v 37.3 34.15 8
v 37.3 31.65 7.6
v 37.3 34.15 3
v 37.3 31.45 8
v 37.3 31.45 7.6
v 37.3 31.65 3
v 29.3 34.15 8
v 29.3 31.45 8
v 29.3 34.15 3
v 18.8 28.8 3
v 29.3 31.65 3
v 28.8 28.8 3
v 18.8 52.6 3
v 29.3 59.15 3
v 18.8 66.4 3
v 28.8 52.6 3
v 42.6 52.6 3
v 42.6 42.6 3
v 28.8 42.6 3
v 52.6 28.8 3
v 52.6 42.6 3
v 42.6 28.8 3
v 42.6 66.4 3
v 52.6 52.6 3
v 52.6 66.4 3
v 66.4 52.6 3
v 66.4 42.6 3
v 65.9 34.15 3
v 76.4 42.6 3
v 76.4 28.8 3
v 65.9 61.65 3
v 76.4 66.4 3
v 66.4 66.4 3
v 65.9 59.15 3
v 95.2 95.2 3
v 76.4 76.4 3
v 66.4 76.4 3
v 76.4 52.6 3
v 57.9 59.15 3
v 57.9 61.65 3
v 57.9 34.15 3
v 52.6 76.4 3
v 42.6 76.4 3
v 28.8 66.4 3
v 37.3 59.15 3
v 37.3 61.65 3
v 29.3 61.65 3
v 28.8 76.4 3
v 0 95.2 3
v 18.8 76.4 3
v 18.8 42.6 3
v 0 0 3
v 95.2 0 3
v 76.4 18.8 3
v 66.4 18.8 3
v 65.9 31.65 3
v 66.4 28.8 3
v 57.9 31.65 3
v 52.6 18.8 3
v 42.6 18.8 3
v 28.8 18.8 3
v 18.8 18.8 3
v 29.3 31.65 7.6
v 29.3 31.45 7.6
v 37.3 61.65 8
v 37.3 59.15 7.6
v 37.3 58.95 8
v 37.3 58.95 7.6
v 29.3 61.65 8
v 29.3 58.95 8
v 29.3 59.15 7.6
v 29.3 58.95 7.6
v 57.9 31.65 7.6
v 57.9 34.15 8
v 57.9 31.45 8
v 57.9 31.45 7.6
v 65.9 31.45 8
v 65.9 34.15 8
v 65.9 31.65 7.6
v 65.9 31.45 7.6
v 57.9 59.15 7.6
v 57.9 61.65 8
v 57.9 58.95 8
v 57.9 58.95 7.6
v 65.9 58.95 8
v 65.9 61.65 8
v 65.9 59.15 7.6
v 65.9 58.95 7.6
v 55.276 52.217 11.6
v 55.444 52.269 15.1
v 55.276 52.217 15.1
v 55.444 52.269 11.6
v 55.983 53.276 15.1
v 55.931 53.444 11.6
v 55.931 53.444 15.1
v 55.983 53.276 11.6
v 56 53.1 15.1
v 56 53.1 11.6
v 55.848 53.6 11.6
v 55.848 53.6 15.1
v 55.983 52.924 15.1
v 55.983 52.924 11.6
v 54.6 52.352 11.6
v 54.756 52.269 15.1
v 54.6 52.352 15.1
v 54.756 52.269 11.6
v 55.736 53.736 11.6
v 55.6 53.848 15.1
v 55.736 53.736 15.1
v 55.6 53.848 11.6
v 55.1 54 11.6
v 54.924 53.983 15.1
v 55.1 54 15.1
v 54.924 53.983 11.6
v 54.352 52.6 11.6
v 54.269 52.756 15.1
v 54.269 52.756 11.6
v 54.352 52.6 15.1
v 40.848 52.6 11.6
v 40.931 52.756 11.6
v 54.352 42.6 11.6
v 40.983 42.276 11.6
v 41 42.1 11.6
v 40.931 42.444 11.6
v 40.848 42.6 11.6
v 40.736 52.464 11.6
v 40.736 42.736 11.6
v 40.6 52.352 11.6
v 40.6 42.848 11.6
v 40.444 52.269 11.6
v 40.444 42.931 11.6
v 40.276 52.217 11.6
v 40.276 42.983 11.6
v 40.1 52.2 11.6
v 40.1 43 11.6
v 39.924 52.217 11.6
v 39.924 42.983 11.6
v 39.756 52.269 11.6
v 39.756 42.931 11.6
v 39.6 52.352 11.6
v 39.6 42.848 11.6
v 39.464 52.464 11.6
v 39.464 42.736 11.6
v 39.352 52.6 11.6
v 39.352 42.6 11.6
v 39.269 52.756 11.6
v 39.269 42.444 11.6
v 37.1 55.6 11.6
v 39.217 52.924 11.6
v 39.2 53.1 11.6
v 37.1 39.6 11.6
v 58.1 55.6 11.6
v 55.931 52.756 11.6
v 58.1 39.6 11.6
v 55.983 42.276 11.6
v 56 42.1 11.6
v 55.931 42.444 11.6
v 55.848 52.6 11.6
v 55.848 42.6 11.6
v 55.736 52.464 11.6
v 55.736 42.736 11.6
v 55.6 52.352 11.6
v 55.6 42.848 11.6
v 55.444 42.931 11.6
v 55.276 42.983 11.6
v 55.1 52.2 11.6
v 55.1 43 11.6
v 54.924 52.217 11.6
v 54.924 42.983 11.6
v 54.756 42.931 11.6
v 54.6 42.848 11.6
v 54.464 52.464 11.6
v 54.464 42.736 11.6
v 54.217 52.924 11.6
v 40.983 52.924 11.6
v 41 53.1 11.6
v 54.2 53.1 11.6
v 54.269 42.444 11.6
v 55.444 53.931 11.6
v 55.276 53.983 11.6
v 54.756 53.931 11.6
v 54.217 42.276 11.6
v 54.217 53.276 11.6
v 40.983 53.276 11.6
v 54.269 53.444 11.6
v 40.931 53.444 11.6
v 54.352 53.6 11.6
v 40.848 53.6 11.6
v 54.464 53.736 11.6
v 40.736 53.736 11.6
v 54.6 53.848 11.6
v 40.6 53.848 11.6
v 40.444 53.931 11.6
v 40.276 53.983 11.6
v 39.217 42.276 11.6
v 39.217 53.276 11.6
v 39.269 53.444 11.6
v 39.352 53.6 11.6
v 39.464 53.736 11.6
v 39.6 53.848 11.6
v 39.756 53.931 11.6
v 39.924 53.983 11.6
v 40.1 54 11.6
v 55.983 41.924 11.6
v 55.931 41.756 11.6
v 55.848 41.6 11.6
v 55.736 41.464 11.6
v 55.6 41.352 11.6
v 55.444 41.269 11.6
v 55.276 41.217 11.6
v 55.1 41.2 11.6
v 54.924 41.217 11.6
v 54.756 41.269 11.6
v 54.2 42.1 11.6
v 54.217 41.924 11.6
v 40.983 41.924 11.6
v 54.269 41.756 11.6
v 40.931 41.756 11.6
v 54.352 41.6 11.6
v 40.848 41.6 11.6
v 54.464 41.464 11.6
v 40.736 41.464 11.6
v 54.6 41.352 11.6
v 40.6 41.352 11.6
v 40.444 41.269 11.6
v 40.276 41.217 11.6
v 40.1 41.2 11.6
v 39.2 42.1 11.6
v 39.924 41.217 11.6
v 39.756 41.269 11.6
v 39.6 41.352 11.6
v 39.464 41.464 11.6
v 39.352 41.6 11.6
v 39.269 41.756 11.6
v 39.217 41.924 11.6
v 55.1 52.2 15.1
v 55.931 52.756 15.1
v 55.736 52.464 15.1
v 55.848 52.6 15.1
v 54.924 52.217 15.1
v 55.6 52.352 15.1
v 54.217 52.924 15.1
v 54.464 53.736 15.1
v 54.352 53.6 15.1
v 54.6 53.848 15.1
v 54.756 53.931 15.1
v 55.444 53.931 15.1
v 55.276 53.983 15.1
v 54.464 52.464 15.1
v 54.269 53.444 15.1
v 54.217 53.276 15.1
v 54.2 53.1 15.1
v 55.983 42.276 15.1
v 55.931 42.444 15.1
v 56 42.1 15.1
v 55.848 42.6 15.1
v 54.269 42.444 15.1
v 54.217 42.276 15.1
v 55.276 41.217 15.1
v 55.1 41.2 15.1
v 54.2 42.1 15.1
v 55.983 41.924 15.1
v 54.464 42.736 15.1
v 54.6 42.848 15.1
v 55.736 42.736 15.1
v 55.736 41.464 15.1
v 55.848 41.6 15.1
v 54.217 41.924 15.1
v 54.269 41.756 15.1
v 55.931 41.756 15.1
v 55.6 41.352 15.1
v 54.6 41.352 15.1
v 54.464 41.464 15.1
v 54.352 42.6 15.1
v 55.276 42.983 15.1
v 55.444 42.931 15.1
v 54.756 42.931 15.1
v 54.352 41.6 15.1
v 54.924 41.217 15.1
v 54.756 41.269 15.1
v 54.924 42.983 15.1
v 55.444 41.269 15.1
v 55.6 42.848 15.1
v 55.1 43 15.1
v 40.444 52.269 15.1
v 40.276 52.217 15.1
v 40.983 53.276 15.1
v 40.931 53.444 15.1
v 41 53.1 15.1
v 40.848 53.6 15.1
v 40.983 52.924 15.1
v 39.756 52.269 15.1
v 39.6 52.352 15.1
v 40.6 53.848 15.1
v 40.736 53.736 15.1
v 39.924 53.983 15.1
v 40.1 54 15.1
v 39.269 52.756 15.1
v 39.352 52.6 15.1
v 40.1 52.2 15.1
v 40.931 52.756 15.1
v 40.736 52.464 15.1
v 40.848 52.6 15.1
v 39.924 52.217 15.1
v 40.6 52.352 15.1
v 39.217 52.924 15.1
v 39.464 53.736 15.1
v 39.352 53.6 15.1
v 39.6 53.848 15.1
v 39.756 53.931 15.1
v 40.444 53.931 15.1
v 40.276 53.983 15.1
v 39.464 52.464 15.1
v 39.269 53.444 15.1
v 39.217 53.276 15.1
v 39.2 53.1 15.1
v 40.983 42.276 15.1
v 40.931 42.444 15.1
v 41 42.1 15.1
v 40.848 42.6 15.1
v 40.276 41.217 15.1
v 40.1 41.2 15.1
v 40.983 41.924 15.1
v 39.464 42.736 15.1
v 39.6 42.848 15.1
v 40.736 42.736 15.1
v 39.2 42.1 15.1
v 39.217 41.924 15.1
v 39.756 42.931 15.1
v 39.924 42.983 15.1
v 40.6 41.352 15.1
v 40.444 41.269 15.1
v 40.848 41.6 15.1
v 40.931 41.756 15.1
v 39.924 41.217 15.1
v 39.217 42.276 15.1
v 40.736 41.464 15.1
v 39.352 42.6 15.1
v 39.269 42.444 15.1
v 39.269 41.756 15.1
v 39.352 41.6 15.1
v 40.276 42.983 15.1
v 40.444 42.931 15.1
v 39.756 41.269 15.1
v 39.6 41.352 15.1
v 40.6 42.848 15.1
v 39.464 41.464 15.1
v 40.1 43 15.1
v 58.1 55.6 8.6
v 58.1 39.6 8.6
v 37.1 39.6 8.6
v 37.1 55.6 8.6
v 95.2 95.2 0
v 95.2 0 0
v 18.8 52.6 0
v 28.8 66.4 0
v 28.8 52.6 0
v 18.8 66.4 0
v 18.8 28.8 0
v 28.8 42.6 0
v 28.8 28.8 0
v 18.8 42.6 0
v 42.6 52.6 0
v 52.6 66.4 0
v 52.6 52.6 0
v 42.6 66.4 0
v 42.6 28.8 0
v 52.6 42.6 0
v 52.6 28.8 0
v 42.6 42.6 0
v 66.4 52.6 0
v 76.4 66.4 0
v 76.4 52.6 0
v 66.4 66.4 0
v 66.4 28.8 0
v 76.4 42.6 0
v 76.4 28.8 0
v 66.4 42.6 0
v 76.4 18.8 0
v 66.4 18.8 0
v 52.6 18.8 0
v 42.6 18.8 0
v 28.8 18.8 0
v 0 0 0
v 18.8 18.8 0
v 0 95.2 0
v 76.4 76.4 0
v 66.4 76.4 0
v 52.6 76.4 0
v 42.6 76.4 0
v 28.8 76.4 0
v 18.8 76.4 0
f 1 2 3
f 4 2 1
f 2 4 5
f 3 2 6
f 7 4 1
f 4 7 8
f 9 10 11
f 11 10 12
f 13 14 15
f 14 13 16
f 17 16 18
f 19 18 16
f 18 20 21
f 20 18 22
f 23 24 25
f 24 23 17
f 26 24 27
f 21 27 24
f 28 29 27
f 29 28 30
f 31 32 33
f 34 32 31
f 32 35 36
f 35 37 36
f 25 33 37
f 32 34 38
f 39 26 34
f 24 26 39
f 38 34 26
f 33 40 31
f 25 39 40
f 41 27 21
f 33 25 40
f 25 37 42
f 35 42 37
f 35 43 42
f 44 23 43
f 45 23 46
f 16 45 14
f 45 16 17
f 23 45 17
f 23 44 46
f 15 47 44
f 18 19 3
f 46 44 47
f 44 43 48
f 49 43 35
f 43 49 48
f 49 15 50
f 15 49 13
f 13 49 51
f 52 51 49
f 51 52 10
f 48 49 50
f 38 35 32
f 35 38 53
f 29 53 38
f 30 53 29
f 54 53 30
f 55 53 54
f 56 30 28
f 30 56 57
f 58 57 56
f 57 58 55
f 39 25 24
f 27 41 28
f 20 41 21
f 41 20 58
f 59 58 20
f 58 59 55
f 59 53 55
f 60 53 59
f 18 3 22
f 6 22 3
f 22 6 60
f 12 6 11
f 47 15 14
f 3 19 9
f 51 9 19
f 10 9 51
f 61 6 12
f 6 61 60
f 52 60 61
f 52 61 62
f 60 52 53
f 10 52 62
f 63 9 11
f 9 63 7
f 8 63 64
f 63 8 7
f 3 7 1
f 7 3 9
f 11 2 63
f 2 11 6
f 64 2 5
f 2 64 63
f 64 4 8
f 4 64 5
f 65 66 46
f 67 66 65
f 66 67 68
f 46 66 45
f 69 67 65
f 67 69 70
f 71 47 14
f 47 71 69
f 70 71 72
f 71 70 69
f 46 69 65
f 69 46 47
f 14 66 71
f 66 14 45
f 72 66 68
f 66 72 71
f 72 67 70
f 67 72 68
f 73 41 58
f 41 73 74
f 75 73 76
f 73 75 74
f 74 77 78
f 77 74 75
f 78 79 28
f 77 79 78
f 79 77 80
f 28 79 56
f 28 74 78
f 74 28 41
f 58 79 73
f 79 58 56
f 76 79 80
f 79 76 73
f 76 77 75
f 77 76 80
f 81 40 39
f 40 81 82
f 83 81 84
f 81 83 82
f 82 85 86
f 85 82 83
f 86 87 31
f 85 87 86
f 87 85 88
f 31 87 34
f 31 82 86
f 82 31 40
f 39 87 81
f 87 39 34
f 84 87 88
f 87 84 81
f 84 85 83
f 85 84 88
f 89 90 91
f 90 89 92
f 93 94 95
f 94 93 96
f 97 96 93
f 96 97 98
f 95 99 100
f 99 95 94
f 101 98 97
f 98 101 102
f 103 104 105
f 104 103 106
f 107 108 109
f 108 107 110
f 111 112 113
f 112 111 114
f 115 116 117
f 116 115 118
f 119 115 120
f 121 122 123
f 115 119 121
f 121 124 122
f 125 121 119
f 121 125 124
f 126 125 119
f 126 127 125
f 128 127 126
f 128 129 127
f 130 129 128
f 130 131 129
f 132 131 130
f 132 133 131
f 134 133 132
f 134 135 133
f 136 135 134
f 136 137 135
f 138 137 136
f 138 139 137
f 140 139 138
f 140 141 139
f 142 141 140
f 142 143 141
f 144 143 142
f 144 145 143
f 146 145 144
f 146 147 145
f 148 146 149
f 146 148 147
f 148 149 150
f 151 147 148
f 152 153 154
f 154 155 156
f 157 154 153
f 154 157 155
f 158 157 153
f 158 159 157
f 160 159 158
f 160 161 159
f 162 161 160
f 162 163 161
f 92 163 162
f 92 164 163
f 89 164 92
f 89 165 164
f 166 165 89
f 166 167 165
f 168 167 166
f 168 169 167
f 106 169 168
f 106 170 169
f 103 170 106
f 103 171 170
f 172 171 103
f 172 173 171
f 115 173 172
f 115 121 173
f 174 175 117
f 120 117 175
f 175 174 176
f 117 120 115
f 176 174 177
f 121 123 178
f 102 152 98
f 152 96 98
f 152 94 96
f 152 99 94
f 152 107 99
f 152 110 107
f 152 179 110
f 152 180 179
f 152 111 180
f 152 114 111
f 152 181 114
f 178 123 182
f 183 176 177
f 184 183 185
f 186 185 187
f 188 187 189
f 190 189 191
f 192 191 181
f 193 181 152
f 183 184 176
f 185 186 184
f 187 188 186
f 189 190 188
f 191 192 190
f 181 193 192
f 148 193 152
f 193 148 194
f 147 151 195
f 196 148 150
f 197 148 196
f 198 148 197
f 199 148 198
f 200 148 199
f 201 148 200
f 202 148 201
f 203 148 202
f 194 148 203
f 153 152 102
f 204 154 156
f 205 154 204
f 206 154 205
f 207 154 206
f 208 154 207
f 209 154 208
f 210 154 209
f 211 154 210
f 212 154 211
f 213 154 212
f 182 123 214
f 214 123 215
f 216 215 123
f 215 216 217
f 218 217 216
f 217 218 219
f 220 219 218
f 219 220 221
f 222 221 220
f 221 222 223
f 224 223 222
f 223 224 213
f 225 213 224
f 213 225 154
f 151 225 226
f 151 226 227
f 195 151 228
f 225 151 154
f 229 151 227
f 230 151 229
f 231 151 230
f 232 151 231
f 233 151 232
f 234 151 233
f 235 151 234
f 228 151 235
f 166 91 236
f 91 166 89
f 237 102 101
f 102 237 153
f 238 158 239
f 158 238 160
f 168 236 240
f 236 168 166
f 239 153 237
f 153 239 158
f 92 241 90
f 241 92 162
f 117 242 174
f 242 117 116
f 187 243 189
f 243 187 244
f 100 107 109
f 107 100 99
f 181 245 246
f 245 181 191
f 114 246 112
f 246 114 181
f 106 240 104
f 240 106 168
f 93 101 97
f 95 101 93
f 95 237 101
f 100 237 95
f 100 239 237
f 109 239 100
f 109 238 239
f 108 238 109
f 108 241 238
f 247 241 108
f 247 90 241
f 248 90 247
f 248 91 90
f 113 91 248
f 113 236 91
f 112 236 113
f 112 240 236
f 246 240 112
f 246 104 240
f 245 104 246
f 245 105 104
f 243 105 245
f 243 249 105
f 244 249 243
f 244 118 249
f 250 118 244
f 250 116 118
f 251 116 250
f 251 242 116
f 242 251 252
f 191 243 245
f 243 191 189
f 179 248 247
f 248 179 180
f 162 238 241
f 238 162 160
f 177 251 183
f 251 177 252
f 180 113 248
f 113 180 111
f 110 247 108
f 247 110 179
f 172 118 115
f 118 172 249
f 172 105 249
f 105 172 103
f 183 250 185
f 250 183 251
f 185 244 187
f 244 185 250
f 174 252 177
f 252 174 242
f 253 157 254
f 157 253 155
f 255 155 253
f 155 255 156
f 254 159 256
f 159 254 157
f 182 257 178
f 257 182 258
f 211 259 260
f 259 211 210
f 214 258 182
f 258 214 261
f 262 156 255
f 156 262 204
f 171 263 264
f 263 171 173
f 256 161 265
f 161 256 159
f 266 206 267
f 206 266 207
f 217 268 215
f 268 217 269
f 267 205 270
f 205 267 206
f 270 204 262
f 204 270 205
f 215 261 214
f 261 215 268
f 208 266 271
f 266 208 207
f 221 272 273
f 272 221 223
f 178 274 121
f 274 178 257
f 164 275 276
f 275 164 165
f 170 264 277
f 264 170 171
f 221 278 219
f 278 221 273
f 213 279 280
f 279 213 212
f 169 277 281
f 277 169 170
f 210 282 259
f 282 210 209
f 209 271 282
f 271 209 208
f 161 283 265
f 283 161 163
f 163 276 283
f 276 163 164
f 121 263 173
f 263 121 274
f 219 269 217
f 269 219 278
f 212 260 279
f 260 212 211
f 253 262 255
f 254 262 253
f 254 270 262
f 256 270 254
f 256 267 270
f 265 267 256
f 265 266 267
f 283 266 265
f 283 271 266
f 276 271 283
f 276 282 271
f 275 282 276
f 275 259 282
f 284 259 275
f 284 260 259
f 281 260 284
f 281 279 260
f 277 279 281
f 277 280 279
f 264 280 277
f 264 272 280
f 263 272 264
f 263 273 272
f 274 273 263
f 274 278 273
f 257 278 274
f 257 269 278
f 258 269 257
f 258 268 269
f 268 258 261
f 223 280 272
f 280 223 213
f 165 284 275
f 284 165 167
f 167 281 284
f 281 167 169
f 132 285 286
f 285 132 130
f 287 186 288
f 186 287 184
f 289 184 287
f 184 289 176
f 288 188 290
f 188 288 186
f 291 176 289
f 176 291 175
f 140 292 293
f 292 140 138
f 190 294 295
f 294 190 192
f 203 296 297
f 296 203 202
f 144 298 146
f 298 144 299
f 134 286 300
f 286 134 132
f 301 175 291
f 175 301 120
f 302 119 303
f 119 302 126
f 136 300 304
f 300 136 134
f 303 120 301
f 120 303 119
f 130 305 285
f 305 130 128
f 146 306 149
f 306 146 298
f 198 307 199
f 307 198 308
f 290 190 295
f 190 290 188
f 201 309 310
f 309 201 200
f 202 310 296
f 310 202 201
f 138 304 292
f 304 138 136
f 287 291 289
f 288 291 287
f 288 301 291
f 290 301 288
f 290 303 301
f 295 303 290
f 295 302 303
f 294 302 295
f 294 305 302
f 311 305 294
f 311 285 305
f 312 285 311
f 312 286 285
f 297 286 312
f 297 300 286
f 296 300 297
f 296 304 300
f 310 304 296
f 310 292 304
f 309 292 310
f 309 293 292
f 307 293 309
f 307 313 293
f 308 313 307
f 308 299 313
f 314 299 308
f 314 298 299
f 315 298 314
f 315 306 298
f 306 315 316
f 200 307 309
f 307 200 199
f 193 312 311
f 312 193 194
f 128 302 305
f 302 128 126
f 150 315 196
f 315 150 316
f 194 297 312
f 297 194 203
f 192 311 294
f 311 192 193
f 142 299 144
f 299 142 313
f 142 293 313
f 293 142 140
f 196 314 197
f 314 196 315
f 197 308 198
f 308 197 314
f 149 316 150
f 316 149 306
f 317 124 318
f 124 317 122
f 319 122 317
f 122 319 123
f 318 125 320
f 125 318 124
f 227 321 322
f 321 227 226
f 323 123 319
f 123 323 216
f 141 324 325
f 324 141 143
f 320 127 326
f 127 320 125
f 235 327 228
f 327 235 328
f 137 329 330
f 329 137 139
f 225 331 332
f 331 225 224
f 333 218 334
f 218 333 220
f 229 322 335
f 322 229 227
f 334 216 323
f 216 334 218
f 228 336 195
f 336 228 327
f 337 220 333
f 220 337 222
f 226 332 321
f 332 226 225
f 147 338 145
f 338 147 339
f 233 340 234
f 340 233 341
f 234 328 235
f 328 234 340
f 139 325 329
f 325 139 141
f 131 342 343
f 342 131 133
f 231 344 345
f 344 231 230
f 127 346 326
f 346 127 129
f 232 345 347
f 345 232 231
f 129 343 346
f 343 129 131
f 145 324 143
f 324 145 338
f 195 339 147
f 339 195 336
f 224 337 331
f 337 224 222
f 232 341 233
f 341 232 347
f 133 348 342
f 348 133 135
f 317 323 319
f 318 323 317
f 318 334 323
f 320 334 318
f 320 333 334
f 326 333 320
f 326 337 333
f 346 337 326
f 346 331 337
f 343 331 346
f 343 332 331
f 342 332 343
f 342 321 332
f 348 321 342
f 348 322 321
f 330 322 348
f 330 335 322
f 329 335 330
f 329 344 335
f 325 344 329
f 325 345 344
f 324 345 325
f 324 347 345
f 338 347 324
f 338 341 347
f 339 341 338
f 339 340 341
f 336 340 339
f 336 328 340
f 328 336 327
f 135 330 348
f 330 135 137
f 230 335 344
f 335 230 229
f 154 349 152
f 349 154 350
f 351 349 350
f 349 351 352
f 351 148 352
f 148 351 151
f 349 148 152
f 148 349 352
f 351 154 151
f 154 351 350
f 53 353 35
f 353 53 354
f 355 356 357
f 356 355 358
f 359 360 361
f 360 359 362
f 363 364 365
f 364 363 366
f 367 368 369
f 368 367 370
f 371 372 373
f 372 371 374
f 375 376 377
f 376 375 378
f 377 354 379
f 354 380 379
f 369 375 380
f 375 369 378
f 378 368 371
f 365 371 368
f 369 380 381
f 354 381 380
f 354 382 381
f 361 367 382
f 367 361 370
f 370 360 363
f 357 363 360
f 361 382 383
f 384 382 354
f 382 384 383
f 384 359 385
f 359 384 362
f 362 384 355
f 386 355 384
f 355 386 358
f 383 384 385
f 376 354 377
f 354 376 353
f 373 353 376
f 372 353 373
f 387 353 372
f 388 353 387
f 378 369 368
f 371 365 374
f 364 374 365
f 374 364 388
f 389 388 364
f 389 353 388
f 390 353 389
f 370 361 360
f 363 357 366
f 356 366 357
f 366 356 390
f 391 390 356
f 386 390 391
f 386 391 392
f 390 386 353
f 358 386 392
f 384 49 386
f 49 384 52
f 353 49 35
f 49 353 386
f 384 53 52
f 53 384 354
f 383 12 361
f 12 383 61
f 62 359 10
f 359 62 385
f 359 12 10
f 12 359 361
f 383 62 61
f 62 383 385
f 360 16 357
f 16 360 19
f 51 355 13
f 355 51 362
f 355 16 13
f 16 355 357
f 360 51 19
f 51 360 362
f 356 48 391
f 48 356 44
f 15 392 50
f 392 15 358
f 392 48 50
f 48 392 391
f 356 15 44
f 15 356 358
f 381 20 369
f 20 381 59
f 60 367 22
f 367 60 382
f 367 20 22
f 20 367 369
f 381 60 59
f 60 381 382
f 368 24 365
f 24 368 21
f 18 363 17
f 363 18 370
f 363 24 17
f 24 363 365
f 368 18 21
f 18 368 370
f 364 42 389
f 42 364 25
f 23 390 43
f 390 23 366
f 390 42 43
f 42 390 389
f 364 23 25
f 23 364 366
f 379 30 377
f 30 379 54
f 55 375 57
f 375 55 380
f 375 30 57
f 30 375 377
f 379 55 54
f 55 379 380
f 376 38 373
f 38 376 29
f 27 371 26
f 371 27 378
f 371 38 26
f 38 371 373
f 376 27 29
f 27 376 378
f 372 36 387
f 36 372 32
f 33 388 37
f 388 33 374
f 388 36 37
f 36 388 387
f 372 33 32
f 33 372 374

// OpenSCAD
// ═══════════════════════════════════════════════════════════════
//  CubeSat İç Montaj Tepsisi
//  ESP32 DevKit (38-pin, 55×28 mm) + MPU6050 GY-521 (21×16 mm)
//
//  Tasarım kararları:
//   • ESP32  → ray klipsleri (vidaya gerek yok, PCB kenarından tutulur)
//   • MPU6050 → merkeze yerleştirilmiş platform + pimler
//   • USB-C girişi için yan duvarda pencere (programlarken çıkarmak gerekmez)
//   • Tepsi gövde içine kayar, alt kapak ile kilitlenir
//
//  PARÇA SEÇİMİ (PART değişkeni):
//    "tray"    → ESP32 + MPU6050 tepsisi  (1 adet bas)
//    "preview" → ESP32 ve MPU6050 ile birlikte önizleme
// ═══════════════════════════════════════════════════════════════

PART = "tray";

$fn = 32;

// ── CubeSat gövde iç boyutu ───────────────────────────────────
INNER = 96;       // gövde iç kenar (100mm - 2×2mm et)
TOL   =  0.4;     // tepsi-gövde toleransı
TRAY_W = INNER - TOL*2;   // 95.2 mm
TRAY_H = INNER - TOL*2;
TRAY_T =  3.0;    // taban plaka kalınlığı

// ── ESP32 DevKit v1 (38-pin) ──────────────────────────────────
// PCB boyutu — yaygın clone değerleri
E32_L   = 55.0;   // uzun kenar
E32_W   = 28.0;   // kısa kenar
E32_PCB =  1.6;   // PCB kalınlığı (standart FR4)
E32_PIN =  3.0;   // pin uzunluğu (PCB altında)
CLIP_H  =  5.0;   // klips yüksekliği (PCB + biraz fazla)
CLIP_LIP = 1.2;   // PCB üstünü tutan dudak
CLIP_W  =  8.0;   // her klipsin genişliği

// ── MPU6050 GY-521 ────────────────────────────────────────────
MPU_L   = 21.0;
MPU_W   = 16.0;
MPU_PCB =  1.6;
MPU_POST_H = 3.0; // platform yüksekliği (MPU altındaki boşluk)
MPU_PEG_D  = 1.8; // pim çapı (≈ 2mm deliğe girecek, biraz baskılı)
MPU_PEG_SX = 15.0; // delik açıklığı — kısa kenar
MPU_PEG_SY = 11.0; // delik açıklığı — uzun kenar

// ── Kablo bağı yuvaları ───────────────────────────────────────
TIE_W = 3.5;
TIE_H = 2.0;

// ── USB-C pencere boyutu ──────────────────────────────────────
USB_W = 10;   // USB-C konnektör genişliği + pay
USB_H =  5;

// ═══════════════════════════════════════════════════════════════
//  YARDIMCI MODÜLLER
// ═══════════════════════════════════════════════════════════════

// ESP32 klips (PCB kenarını tutan L-profil)
// origin: klipsin alt-sol köşesi, PCB bu profilin içine girer
module esp32_clip() {
    difference() {
        cube([CLIP_W, E32_PCB + CLIP_LIP + 1.5, CLIP_H]);
        // PCB yuvası
        translate([-0.1, 0, E32_PIN])
            cube([CLIP_W + 0.2, E32_PCB + 0.2, CLIP_H]);
        // alt girişi aç (PCB kayarken girmesi için)
        translate([-0.1, -0.1, -0.1])
            cube([CLIP_W + 0.2, E32_PCB + 0.2 + 0.1, E32_PIN + 0.1]);
    }
    // dudak (PCB üstüne basan kısım)
    translate([0, E32_PCB, E32_PIN + E32_PCB])
        cube([CLIP_W, CLIP_LIP, CLIP_H - E32_PIN - E32_PCB]);
}

// Kablo bağı yuvası
module cable_tie_slot(l = 20) {
    cube([l, TIE_W, TIE_H], center=true);
}

// MPU6050 montaj platformu (PCB'nin altı, ortada)
module mpu_platform() {
    // platform tabanı
    translate([-MPU_L/2, -MPU_W/2, 0])
        cube([MPU_L, MPU_W, MPU_POST_H]);

    // 4 köşe pimi (MPU PCB deliklerine girer, baskılı geçme)
    peg_positions = [
        [ MPU_PEG_SX/2,  MPU_PEG_SY/2],
        [ MPU_PEG_SX/2, -MPU_PEG_SY/2],
        [-MPU_PEG_SX/2,  MPU_PEG_SY/2],
        [-MPU_PEG_SX/2, -MPU_PEG_SY/2],
    ];
    for (p = peg_positions)
        translate([p[0], p[1], MPU_POST_H])
            cylinder(d = MPU_PEG_D, h = 3.5);
}

// ═══════════════════════════════════════════════════════════════
//  ANA TEPSİ
// ═══════════════════════════════════════════════════════════════
module tray() {

    difference() {
        union() {
            // ── Taban plaka ───────────────────────────────────
            cube([TRAY_W, TRAY_H, TRAY_T]);

            // ── ESP32 klipsleri ───────────────────────────────
            // ESP32, tepsinin ortasına yerleştirilmiş
            // Uzun kenar Y eksenine paralel
            esp32_cx = TRAY_W/2;   // orta X
            esp32_cy = TRAY_H/2;   // orta Y

            // Uzun kenar sol (−X)  → 2 klips
            // PCB sol kenarı: esp32_cx - E32_W/2
            left_x = esp32_cx - E32_W/2 - (E32_PCB + CLIP_LIP + 1.5);
            for (y_off = [-E32_L/4, E32_L/4]) {
                translate([left_x,
                           esp32_cy + y_off - CLIP_W/2,
                           TRAY_T])
                    esp32_clip();
            }

            // Uzun kenar sağ (+X) → 2 klips (aynalı)
            right_x = esp32_cx + E32_W/2;
            for (y_off = [-E32_L/4, E32_L/4]) {
                translate([right_x + E32_PCB + CLIP_LIP + 1.5,
                           esp32_cy + y_off - CLIP_W/2,
                           TRAY_T])
                    mirror([1,0,0]) esp32_clip();
            }

            // ── MPU6050 platformu (ESP32'nin üstünde, ortada) ─
            // ESP32 yüzeyi: TRAY_T + E32_PIN + E32_PCB ≈ 8.6 mm
            // MPU platformu bunun üstünde + 1mm ara
            mpu_z = TRAY_T + E32_PIN + E32_PCB + 1.0;
            translate([esp32_cx, esp32_cy, mpu_z])
                mpu_platform();

            // ── Kablo bağı zincirleri (tepsinin köşelerinde) ──
            // kablo bağı için çubuk + delik çifti
            for (cx = [15, TRAY_W-15]) {
                for (cy = [8, TRAY_H-8]) {
                    translate([cx, cy, TRAY_T/2])
                        cable_tie_slot(12);
                }
            }
        }

        // ── Taban delik boşaltma (hafifletme + havalandırma) ──
        for (hx = [1:3]) for (hy = [1:3]) {
            translate([hx * TRAY_W/4 - 5,
                       hy * TRAY_H/4 - 5,
                       -0.1])
                cube([10, 10, TRAY_T + 0.2]);
        }

        // ── USB-C penceresi (kısa kenar duvara gelecek yer) ───
        // ESP32 USB-C'si kısa kenarın ortasında
        // → tepsinin +Y yüzünde pencere aç (ESP32'nin kısa kenarı bu tarafa bakacak)
        esp32_cy2 = TRAY_H/2;
        usb_z = TRAY_T + E32_PIN;  // USB konnektör altı buradan başlıyor yaklaşık
        translate([TRAY_W/2 - USB_W/2,
                   TRAY_H - 0.1,
                   usb_z])
            cube([USB_W, TRAY_T + 0.2, USB_H]);
    }
}

// ═══════════════════════════════════════════════════════════════
//  ESP32 + MPU6050 TEMSİLİ (preview için, baskı için değil)
// ═══════════════════════════════════════════════════════════════
module preview_esp32() {
    color("green", 0.7)
        translate([TRAY_W/2 - E32_W/2, TRAY_H/2 - E32_L/2, TRAY_T + E32_PIN])
            cube([E32_W, E32_L, E32_PCB]);
}

module preview_mpu() {
    mpu_z = TRAY_T + E32_PIN + E32_PCB + 1.0 + MPU_POST_H;
    color("blue", 0.7)
        translate([TRAY_W/2 - MPU_L/2, TRAY_H/2 - MPU_W/2, mpu_z])
            cube([MPU_L, MPU_W, MPU_PCB]);
}

// ═══════════════════════════════════════════════════════════════
//  RENDER
// ═══════════════════════════════════════════════════════════════
if (PART == "tray") {
    tray();
} else {
    tray();
    preview_esp32();
    preview_mpu();
}
